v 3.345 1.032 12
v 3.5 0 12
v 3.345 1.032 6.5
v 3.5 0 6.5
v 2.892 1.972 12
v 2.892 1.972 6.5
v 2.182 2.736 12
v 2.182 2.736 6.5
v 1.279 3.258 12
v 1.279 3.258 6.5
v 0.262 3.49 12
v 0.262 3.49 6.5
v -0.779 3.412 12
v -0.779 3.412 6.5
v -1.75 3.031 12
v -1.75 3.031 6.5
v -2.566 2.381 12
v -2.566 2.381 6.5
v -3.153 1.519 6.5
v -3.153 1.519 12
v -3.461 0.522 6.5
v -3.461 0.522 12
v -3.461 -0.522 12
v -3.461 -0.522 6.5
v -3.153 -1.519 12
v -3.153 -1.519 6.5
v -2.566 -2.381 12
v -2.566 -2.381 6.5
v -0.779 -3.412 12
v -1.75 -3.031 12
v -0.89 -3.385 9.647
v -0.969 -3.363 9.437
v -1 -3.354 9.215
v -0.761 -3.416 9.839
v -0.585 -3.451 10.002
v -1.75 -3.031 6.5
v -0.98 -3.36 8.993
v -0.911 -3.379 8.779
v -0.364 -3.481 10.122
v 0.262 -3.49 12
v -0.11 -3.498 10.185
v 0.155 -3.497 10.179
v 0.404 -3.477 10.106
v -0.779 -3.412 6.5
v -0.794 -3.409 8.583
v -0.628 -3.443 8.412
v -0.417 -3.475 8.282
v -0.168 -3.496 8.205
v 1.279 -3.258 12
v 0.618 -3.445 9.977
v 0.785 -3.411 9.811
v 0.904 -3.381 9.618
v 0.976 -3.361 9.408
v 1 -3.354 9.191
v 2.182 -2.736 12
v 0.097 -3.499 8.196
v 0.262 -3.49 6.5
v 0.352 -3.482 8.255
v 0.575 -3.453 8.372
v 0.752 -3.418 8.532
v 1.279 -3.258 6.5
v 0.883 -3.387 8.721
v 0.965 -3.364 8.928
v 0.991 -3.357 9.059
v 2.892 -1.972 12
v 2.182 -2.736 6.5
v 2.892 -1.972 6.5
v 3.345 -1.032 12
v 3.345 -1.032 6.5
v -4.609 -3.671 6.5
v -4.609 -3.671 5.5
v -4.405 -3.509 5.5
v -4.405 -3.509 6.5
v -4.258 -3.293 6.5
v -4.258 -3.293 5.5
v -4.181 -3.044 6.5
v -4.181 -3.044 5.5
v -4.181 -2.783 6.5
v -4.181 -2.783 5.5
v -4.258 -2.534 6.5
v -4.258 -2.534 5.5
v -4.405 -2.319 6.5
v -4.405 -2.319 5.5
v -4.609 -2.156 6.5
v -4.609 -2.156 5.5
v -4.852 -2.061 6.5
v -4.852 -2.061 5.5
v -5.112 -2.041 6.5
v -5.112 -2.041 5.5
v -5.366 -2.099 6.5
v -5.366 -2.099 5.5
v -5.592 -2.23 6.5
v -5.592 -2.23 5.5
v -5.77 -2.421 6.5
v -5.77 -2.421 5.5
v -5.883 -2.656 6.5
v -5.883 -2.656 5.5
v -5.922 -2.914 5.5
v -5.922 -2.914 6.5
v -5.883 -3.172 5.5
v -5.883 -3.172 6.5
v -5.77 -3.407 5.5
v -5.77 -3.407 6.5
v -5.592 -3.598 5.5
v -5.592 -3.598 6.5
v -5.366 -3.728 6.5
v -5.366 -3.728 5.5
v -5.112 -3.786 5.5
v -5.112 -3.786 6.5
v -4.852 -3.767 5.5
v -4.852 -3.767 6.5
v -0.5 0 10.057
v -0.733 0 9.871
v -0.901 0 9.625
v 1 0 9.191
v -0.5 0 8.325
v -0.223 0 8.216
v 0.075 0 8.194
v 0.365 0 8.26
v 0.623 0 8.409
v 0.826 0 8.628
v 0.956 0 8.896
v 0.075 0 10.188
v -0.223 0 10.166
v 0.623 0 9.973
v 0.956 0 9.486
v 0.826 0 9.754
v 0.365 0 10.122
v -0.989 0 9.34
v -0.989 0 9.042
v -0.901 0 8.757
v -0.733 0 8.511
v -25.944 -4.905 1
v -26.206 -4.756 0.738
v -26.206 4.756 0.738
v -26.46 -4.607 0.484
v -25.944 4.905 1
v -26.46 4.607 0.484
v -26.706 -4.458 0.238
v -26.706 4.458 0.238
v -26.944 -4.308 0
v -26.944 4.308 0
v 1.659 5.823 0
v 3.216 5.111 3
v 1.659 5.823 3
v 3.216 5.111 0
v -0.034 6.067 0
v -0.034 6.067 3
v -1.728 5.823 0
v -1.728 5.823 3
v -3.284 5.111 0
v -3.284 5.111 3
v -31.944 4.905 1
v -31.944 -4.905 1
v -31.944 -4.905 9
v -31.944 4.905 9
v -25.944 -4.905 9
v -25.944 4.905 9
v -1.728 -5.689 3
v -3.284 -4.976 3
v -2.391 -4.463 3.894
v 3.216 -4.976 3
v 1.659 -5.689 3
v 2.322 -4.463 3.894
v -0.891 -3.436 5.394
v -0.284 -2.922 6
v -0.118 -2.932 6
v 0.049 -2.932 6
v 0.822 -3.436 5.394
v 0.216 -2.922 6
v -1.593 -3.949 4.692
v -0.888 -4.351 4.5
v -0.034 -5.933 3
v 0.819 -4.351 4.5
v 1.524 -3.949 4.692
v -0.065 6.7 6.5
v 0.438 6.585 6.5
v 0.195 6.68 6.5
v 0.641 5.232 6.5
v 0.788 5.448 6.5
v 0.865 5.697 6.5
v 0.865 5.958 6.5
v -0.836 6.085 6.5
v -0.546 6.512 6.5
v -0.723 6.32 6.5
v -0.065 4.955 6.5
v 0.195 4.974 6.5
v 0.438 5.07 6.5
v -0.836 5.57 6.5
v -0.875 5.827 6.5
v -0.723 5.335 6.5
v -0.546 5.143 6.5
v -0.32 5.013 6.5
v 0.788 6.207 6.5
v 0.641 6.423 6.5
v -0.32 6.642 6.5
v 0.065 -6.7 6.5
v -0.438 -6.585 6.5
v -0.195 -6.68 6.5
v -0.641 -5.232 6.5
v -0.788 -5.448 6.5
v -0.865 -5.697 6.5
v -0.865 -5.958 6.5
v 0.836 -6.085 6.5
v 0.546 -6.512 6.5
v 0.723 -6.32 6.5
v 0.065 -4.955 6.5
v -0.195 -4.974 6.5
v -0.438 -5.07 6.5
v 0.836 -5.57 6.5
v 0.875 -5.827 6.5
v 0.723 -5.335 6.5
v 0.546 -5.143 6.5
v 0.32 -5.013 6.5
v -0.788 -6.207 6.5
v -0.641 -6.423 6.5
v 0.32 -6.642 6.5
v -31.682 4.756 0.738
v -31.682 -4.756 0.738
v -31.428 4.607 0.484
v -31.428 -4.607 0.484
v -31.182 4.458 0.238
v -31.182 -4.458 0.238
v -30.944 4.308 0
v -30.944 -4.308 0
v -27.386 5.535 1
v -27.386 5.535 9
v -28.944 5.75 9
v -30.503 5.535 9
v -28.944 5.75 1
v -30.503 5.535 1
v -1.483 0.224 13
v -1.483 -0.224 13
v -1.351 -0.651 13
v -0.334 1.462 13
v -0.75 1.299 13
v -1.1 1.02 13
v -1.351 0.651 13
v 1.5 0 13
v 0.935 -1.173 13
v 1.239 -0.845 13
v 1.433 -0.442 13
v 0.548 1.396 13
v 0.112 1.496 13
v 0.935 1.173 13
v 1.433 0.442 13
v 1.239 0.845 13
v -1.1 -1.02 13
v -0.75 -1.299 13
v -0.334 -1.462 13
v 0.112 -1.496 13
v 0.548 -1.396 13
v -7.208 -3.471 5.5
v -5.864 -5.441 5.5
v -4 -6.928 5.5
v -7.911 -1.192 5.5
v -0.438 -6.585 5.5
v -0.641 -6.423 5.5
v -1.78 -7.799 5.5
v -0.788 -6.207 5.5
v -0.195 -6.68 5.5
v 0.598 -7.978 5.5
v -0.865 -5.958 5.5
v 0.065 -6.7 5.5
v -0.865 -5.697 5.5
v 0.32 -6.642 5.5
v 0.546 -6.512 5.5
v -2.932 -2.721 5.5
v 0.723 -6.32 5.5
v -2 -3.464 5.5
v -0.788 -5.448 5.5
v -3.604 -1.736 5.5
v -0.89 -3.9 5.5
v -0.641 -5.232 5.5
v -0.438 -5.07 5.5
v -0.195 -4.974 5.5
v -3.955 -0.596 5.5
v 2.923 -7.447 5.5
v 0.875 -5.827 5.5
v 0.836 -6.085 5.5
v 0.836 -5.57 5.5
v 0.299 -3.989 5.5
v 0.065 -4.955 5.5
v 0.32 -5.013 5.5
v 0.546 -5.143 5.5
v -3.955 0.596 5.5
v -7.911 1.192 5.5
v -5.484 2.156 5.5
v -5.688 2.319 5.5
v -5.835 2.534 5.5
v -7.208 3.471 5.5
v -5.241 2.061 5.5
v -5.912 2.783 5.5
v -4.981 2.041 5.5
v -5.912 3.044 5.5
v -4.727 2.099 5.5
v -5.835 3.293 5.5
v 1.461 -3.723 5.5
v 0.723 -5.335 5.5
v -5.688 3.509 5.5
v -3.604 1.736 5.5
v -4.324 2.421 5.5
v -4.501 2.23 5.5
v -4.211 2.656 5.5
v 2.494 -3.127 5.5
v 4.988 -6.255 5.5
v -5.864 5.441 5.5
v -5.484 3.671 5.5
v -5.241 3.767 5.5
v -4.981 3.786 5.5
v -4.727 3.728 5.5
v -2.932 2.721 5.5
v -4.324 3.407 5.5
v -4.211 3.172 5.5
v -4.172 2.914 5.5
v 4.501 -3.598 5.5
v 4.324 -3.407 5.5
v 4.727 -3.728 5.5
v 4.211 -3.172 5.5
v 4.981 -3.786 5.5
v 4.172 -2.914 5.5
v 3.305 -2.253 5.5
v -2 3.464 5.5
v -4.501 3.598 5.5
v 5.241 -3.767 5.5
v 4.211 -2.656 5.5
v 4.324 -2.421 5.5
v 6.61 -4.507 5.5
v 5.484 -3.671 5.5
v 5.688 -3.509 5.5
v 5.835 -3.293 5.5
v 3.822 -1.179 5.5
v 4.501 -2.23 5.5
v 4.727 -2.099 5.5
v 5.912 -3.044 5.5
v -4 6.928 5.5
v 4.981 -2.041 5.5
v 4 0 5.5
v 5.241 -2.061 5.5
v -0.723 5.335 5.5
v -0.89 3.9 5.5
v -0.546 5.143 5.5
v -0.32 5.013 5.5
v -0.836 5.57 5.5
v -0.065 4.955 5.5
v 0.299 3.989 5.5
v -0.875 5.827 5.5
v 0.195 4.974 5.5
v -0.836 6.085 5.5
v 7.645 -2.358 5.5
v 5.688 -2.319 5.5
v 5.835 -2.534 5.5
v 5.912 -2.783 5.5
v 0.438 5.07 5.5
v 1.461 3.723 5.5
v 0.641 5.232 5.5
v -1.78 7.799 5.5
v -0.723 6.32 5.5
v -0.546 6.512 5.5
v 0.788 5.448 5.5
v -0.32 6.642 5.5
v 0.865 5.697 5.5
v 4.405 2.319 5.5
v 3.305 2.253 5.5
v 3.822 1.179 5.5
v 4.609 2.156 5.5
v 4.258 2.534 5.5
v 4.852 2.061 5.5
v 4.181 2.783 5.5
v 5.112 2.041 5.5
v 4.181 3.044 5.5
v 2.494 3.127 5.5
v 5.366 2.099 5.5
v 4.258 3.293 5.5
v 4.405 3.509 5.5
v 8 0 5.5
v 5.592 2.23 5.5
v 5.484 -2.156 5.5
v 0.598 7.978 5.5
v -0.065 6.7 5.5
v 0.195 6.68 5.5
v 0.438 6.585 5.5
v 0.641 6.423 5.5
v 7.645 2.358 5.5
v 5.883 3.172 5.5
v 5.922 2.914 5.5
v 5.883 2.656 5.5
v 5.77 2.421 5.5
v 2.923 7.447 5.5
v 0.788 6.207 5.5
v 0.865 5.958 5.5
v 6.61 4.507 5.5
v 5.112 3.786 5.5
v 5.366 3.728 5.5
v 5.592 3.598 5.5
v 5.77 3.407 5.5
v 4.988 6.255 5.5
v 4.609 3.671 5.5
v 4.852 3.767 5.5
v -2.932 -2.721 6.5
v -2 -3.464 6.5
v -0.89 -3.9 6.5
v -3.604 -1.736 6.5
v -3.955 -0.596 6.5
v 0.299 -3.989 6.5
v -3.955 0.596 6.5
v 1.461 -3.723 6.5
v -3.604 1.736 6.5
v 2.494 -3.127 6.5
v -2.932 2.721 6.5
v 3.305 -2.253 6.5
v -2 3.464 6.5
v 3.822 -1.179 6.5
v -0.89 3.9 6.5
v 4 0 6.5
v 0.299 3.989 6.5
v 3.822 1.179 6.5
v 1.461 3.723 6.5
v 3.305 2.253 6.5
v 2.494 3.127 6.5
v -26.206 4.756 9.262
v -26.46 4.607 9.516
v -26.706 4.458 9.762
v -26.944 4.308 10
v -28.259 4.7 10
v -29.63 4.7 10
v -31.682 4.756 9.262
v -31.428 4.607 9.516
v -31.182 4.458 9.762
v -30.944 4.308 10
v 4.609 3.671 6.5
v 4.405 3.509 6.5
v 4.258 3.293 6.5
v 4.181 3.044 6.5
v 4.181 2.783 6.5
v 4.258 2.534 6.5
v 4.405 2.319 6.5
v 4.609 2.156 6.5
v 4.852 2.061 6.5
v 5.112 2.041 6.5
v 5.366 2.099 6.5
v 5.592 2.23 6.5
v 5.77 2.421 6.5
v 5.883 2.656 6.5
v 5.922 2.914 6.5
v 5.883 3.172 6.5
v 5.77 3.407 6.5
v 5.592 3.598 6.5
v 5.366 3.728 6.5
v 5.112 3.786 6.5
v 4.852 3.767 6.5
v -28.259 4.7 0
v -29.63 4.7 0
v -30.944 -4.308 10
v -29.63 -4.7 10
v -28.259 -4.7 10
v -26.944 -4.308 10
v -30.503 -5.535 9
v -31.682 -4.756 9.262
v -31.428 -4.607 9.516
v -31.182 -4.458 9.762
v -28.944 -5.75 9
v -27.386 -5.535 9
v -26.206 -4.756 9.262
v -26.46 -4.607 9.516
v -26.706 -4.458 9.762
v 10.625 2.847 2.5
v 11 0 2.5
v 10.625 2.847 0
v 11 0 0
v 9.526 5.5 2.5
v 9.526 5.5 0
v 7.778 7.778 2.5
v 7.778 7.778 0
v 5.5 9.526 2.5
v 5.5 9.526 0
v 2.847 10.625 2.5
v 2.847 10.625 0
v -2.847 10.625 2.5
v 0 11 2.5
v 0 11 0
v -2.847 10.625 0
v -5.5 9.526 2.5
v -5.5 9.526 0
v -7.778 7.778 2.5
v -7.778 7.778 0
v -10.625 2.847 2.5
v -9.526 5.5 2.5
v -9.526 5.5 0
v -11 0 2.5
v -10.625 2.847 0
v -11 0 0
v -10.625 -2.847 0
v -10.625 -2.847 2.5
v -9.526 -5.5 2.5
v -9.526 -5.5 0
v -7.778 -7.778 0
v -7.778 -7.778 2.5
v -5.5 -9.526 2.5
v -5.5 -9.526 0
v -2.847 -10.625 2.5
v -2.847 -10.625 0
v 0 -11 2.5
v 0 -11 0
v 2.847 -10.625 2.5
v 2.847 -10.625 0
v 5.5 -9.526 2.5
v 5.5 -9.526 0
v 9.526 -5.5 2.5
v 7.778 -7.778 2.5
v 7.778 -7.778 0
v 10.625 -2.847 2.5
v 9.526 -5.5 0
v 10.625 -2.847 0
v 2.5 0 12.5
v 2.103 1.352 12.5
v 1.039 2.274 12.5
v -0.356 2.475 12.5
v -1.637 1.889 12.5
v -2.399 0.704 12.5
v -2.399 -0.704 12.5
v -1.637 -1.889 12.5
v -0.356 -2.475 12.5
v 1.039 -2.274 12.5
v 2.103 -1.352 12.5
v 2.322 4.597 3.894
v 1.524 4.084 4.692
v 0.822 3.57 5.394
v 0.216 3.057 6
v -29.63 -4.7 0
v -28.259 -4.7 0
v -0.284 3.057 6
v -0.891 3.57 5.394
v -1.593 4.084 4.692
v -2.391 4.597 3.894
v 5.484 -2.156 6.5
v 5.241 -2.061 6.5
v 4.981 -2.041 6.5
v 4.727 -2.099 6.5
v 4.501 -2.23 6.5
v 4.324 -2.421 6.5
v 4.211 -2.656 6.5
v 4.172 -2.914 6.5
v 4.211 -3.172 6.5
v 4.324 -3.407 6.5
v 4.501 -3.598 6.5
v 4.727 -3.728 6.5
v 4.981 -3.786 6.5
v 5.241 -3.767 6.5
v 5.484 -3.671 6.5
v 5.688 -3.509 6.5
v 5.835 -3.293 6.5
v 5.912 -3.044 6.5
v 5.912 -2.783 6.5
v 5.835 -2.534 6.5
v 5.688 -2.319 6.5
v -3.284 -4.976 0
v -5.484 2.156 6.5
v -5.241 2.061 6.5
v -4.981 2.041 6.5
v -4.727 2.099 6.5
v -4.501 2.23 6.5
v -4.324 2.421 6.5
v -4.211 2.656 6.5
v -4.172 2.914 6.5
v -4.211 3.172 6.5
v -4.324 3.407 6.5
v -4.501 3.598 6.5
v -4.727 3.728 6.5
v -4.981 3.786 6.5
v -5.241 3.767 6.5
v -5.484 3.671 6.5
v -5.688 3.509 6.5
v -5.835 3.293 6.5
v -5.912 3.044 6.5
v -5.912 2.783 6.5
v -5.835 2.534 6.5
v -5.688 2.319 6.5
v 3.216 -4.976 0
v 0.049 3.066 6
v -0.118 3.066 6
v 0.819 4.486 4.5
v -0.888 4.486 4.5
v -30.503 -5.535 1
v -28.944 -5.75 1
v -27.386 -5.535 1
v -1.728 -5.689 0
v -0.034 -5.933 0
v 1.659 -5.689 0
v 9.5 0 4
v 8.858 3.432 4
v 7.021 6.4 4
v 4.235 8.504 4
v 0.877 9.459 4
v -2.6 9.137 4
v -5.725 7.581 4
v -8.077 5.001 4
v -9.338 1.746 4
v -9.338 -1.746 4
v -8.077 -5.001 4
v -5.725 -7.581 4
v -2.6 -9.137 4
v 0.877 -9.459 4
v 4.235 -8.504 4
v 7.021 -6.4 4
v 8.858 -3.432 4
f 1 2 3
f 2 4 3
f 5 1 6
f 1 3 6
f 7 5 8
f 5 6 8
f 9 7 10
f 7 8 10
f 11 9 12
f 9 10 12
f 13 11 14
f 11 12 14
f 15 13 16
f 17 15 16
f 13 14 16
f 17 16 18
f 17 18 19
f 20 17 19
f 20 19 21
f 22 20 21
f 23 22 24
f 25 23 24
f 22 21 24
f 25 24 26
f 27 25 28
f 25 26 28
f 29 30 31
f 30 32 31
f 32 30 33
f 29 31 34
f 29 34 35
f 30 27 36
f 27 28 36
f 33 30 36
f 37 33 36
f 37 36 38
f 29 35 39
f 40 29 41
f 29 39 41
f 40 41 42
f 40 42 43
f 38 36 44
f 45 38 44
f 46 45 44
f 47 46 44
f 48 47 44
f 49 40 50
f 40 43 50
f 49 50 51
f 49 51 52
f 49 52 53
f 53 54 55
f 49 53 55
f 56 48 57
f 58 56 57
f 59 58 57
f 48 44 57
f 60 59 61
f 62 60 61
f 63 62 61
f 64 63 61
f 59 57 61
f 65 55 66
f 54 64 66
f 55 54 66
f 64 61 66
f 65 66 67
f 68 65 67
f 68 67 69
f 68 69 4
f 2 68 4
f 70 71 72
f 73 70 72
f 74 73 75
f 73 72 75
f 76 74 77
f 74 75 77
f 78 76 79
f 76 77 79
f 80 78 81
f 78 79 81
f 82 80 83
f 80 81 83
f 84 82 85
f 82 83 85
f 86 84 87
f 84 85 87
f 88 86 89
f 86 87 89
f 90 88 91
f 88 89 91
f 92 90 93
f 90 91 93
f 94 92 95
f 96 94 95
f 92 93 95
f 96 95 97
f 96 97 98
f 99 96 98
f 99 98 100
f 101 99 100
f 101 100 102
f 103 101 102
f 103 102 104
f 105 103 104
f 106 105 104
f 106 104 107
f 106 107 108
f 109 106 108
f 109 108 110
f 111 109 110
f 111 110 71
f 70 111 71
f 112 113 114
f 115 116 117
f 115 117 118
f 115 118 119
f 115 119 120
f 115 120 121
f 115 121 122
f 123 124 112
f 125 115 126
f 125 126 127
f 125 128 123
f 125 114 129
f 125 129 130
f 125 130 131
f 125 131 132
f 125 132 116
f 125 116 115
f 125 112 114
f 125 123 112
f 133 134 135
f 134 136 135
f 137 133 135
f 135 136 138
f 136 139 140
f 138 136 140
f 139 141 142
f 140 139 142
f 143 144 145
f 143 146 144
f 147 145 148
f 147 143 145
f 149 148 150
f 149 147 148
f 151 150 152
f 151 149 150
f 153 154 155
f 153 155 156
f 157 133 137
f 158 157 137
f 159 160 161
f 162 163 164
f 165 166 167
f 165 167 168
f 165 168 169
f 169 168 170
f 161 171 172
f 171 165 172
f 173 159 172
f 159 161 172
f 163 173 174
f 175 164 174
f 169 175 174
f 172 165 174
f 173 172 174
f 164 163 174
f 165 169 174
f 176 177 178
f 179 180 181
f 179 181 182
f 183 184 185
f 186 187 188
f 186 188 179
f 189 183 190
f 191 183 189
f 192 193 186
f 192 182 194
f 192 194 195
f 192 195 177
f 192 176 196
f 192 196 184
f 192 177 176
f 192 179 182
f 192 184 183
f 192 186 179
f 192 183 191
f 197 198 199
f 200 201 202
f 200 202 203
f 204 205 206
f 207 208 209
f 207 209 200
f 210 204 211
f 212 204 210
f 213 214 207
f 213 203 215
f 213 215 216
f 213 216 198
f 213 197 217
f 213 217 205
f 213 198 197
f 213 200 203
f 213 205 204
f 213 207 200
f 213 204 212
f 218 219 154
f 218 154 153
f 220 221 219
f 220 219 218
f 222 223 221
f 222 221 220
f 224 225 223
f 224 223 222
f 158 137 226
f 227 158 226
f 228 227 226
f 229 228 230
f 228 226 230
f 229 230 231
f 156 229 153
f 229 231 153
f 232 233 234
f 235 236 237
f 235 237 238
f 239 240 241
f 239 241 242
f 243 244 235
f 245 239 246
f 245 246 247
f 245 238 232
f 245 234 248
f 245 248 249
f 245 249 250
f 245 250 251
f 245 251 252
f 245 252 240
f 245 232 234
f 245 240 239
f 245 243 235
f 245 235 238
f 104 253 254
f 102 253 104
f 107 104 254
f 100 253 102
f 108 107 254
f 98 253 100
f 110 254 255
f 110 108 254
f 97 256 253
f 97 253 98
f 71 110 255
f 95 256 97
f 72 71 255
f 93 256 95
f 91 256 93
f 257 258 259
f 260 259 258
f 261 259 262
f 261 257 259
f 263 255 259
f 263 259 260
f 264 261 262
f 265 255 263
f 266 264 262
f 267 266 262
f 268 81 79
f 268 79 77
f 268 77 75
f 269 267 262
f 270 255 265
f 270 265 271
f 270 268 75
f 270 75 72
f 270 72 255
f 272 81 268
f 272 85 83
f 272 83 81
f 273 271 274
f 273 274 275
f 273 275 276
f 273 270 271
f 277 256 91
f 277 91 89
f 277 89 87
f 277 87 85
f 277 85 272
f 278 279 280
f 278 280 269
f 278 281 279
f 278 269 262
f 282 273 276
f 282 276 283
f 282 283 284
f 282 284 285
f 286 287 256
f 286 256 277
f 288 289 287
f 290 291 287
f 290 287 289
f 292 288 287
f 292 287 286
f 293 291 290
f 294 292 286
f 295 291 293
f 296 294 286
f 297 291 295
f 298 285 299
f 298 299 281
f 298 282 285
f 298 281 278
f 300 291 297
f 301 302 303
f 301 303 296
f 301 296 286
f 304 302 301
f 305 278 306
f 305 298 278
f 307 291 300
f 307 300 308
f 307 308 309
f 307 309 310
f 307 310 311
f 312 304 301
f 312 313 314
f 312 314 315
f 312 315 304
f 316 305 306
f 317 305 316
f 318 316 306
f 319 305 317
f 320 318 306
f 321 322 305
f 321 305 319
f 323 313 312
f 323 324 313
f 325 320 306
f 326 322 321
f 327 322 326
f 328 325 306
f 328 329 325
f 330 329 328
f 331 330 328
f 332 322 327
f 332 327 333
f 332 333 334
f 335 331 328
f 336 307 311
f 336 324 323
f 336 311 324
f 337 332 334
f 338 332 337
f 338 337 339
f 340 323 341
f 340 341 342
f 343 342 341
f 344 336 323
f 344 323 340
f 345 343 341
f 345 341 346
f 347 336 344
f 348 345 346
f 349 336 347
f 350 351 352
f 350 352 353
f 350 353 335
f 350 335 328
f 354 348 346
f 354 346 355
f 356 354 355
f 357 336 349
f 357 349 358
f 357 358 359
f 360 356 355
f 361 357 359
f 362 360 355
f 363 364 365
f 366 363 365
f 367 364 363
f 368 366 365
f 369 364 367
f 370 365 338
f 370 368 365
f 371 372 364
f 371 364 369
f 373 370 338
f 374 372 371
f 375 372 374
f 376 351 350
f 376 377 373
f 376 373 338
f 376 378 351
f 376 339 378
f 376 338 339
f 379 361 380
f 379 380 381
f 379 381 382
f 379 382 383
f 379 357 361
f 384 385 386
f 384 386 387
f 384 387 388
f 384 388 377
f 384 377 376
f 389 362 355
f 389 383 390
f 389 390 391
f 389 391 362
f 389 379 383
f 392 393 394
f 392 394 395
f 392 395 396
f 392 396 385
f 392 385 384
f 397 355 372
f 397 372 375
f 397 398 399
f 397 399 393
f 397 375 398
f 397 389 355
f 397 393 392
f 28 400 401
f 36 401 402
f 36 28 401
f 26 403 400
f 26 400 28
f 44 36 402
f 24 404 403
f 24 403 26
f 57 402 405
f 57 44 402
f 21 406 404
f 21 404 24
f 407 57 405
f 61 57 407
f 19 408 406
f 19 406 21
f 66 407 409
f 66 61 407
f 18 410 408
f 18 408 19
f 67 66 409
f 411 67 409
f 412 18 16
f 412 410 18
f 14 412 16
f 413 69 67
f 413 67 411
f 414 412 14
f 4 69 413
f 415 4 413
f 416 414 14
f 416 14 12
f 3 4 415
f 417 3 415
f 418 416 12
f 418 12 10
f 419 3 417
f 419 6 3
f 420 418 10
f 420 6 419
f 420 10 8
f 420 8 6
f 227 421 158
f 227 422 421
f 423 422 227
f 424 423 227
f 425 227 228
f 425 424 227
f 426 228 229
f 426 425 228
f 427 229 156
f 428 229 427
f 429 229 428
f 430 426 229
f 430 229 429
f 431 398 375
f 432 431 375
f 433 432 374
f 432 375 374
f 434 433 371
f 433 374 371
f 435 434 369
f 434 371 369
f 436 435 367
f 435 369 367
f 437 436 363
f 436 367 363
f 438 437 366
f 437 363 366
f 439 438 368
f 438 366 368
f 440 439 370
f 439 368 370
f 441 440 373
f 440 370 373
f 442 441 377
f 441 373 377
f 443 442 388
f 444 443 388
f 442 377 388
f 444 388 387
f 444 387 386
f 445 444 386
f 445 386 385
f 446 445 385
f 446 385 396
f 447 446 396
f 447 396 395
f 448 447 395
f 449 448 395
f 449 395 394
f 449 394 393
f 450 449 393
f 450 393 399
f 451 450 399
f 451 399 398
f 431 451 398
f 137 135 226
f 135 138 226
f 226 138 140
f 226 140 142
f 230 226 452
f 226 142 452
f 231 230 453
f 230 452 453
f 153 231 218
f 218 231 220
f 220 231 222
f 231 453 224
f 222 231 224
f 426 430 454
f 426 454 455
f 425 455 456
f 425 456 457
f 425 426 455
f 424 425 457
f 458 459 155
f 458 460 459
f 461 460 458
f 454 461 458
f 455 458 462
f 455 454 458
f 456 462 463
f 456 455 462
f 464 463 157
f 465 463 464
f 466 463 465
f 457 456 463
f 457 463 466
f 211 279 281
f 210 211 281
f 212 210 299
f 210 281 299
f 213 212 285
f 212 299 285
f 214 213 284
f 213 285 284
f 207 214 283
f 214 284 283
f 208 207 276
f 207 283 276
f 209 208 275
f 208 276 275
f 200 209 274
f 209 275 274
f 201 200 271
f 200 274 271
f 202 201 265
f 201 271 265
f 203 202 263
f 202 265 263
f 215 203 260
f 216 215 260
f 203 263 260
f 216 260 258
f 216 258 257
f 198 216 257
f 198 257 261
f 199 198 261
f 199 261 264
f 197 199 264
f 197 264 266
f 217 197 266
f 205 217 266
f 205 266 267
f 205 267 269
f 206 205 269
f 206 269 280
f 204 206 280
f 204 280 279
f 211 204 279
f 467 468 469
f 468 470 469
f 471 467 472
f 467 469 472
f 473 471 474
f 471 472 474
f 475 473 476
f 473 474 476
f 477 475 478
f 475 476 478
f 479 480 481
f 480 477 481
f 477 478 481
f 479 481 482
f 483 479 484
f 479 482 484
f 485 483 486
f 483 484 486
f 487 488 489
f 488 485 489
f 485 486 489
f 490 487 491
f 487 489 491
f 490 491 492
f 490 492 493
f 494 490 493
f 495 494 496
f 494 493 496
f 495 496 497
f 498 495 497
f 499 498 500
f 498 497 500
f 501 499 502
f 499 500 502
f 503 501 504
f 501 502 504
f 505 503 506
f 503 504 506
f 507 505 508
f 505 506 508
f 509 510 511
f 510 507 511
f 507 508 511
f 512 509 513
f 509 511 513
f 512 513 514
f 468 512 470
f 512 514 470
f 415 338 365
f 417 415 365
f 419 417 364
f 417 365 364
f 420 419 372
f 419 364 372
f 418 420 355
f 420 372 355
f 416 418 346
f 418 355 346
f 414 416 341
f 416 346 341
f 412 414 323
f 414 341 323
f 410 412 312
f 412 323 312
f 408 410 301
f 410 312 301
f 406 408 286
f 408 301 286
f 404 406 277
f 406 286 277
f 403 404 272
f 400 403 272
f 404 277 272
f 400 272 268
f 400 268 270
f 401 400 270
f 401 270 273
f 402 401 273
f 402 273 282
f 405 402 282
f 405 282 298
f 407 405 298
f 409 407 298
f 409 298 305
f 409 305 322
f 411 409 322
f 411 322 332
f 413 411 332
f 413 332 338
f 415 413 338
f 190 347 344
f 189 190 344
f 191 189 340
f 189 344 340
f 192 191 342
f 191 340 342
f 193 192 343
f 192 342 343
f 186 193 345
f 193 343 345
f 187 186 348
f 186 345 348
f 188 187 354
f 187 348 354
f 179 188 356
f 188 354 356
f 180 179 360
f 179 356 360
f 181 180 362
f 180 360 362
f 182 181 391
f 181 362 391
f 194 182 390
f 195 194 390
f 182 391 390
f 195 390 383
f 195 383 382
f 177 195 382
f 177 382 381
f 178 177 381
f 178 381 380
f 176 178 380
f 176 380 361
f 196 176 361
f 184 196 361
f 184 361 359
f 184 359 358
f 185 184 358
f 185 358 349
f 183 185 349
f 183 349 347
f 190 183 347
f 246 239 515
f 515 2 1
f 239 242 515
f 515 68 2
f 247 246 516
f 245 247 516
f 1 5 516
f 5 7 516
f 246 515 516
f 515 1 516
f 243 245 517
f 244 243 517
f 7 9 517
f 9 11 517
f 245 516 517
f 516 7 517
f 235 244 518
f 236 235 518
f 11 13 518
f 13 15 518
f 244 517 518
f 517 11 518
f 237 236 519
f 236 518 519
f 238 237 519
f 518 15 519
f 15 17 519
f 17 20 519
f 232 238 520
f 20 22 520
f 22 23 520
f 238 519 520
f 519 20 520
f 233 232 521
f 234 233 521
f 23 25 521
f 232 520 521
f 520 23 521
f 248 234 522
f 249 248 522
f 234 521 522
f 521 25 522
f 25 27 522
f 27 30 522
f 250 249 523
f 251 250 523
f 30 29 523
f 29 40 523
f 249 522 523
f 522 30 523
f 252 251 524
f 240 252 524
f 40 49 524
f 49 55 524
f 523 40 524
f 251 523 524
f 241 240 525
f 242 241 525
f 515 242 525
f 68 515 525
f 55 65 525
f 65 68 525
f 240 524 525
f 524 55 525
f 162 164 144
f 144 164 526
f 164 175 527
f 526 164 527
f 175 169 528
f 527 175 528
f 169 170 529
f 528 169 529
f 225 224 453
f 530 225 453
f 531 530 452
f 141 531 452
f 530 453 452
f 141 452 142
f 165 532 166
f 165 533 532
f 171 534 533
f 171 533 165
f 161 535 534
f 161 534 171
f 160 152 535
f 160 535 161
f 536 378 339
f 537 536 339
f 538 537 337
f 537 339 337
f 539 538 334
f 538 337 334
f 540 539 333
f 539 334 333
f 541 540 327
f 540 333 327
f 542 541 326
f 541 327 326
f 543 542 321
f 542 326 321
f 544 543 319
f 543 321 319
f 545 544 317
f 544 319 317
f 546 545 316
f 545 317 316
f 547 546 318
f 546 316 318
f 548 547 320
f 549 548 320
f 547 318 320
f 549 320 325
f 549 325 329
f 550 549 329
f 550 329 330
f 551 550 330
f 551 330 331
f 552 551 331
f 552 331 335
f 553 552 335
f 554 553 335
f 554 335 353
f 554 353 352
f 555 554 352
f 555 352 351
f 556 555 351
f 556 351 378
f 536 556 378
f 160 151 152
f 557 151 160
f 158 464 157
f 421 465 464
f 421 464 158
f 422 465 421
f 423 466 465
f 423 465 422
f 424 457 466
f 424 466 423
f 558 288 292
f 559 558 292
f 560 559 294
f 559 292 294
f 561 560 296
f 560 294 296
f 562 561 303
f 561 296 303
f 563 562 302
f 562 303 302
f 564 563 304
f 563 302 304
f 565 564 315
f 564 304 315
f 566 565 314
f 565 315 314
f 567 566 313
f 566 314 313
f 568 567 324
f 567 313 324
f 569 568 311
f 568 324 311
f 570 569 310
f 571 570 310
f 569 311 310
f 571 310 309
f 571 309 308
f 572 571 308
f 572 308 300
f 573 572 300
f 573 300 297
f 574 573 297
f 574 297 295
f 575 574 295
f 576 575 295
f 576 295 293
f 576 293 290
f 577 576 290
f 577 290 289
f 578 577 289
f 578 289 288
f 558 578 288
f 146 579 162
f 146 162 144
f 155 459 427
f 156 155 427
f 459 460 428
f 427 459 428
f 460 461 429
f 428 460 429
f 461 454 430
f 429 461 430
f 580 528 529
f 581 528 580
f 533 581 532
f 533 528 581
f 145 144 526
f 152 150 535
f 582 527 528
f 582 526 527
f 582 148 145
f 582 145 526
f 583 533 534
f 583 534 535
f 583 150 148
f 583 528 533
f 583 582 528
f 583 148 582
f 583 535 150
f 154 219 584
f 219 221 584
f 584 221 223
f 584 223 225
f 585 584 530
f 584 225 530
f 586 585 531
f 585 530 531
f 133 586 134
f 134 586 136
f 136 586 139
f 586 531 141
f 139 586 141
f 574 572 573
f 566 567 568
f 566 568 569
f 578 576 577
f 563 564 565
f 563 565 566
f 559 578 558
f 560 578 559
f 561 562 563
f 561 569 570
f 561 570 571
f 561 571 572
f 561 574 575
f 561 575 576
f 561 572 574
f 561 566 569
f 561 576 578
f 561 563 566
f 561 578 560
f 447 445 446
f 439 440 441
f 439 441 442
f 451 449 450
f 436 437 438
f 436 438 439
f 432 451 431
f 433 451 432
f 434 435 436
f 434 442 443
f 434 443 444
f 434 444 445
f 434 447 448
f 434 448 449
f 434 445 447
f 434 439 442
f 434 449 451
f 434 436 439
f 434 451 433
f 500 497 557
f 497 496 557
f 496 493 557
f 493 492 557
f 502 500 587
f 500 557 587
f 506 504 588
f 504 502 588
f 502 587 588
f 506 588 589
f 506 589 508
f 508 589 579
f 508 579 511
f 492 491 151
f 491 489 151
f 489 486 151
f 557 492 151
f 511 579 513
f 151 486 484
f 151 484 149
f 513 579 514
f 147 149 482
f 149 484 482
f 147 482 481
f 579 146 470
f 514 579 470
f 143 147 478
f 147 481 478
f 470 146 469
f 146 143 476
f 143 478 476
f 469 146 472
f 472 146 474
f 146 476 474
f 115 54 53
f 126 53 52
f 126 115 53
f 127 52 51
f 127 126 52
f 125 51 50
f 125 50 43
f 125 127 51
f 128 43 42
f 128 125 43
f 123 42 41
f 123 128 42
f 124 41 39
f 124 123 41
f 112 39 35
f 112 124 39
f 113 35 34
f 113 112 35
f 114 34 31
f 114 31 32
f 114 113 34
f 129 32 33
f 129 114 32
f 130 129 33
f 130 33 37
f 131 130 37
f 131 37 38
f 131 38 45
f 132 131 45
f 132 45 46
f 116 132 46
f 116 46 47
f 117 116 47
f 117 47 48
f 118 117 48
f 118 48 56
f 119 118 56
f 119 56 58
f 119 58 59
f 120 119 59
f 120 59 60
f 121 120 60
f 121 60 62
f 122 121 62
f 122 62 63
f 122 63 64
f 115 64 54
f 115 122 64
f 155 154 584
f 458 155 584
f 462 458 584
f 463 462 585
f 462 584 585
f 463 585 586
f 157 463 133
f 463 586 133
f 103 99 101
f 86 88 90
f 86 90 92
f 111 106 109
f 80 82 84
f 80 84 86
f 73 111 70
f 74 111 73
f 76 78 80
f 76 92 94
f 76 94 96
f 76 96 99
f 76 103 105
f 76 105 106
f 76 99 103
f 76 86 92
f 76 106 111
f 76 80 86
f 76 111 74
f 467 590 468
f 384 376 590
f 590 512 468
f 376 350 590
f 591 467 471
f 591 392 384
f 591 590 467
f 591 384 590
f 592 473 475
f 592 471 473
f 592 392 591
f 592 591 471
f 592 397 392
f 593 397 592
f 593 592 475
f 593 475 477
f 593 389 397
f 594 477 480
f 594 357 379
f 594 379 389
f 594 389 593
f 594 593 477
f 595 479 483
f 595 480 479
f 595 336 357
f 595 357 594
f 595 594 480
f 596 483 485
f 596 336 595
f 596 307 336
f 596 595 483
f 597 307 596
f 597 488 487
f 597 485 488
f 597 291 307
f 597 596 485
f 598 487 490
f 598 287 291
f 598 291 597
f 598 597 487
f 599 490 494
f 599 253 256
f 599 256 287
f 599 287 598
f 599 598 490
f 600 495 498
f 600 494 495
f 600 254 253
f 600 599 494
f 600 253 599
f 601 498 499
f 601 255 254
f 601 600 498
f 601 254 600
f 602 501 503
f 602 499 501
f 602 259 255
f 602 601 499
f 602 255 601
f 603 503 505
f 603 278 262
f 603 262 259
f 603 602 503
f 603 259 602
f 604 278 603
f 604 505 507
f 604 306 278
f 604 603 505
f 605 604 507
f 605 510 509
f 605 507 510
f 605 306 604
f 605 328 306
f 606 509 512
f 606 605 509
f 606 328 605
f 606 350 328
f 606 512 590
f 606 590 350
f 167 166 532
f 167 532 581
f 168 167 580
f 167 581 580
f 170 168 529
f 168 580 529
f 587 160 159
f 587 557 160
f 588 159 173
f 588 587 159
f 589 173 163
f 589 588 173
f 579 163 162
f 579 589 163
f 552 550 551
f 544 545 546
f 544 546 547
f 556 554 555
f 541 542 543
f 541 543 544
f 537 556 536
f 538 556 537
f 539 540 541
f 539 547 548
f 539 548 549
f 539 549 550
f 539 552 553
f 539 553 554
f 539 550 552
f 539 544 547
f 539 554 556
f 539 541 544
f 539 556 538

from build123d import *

# Parameters (mm, degrees)
F0_W        = 6
F0_H        = 9.8107084352
F1_DEPTH    = 10
F2_SIZE     = 1
F3_R        = 11
F4_DEPTH    = 5.5
F5_SIZE     = 3
F6_R        = 0.875
F7_DEPTH    = 6.5
F8_COUNT    = 6
F9_R        = 4
F10_DEPTH   = 6.5
F11_R       = 3.5
F12_DEPTH   = 13
F13_SIZE2   = 1
F13_SIZE    = 2
F15_DEPTH   = 6
F16_C1_SIZE = 3
F16_C2_SIZE = 3
F16_C3_SIZE = 3
F16_C4_SIZE = 3
F18_R       = 1
F19_DEPTH   = 4


with BuildPart() as f1:
    # F0 (on Top) → F1 (new body)
    with BuildSketch(Plane.XY):
        with BuildLine():
            Line((-31.9442992674, 4.9053542176), (-25.9442992674, 4.9053542176))
            ThreePointArc((-25.9442992674, 4.9053542176), (-28.9442992674, 5.75), (-31.9442992674, 4.9053542176))
        make_face()
        with Locations((-28.9442992674, 0)):
            Rectangle(F0_W, F0_H)
        with BuildLine():
            ThreePointArc((-31.9442992674, -4.9053542176), (-28.9442992674, -5.75), (-25.9442992674, -4.9053542176))
            Line((-25.9442992674, -4.9053542176), (-31.9442992674, -4.9053542176))
        make_face()
    extrude(amount=F1_DEPTH)

    # F2
    f2_edges = [f1.edges().sort_by_distance(p)[0] for p in [
        (-28.944299, 5.75, 10),
        (-31.944299, 0, 10),
        (-28.944299, -5.75, 10),
        (-25.944299, 0, 10),
        (-28.944299, 5.75, 0),
        (-31.944299, 0, 0),
        (-28.944299, -5.75, 0),
        (-25.944299, 0, 0),
    ]]
    chamfer(f2_edges, length=F2_SIZE)


with BuildPart() as f4:
    # F3 (on Top) → F4 (new body)
    with BuildSketch(Plane.XY):
        Circle(F3_R)
    extrude(amount=F4_DEPTH)

    # F5
    f5_edges = [f4.edges().sort_by_distance(p)[0] for p in [
        (-11, 0, 5.5),
    ]]
    chamfer(f5_edges, length=F5_SIZE)

    # F6 (on Top) → F7 (join)
    with BuildSketch(Plane.XY):
        with Locations((0, -5.8274352923)):
            Circle(F6_R)
    extrude(amount=F7_DEPTH)

    # F8: F4 ×6 about axis
    f8_axis = Axis((0, 0, 5.5), (0, 0, 1))


with BuildPart() as f4_1:
    add(f4.part)
    for i in range(1, F8_COUNT):
        add(f4.part.rotate(f8_axis, i * 360 / F8_COUNT))

    # F9 (on Top) → F10 (join)
    with BuildSketch(Plane.XY):
        Circle(F9_R)
    extrude(amount=F10_DEPTH)

    # F11 (on Top) → F12 (join)
    with BuildSketch(Plane.XY):
        Circle(F11_R)
    extrude(amount=F12_DEPTH)

    # F13
    f13_edges = [f4_1.edges().sort_by_distance(p)[0] for p in [
        (-3.5, 0, 13),
    ]]
    f13_side = f4_1.faces().sort_by_distance((0, 0, 13))[0]
    chamfer(f13_edges, length=F13_SIZE, length2=F13_SIZE2, reference=f13_side)


with BuildPart() as f15:
    # F14 (on Top) → F15 (new body)
    with BuildSketch(Plane.XY):
        with BuildLine():
            Line((-3.2844228611, 5.110756855), (-3.2844228611, -4.976363646))
            ThreePointArc((-3.2844228611, -4.976363646), (-0.0344228611, -5.9328033955), (3.2155771389, -4.976363646))
            Line((3.2155771389, -4.976363646), (3.2155771389, 5.110756855))
            ThreePointArc((3.2155771389, 5.110756855), (-0.0344228611, 6.0671966045), (-3.2844228611, 5.110756855))
        make_face()
    extrude(amount=F15_DEPTH)

    # F16: chamfer of 3 on 4 edges, made by hand

    # F16_c1
    f16_c1_edges = [f15.edges().sort_by_distance(p)[0] for p in [
        (3.2155771389, 0.0671966045, 6),
    ]]
    chamfer(f16_c1_edges, length=F16_C1_SIZE)

    # F16_c2
    f16_c2_edges = [f15.edges().sort_by_distance(p)[0] for p in [
        (-3.2844228611, 0.0671966045, 6),
    ]]
    chamfer(f16_c2_edges, length=F16_C2_SIZE)

    # F16_c3
    f16_c3_edges = [f15.edges().sort_by_distance(p)[0] for p in [
        (-0.0344228611, -5.9328033955, 6),
    ]]
    chamfer(f16_c3_edges, length=F16_C3_SIZE)

    # F16_c4
    f16_c4_edges = [f15.edges().sort_by_distance(p)[0] for p in [
        (-0.0344228611, 6.0671966045, 6),
    ]]
    chamfer(f16_c4_edges, length=F16_C4_SIZE)


with BuildPart() as f4_2:
    add(f4_1.part)

    # F17: cut F15
    add(f15.part, mode=Mode.SUBTRACT)

    # F18 (on Front) → F19 (cut)
    with BuildSketch(Plane.XZ):
        with Locations((0, 9.1908816248)):
            Circle(F18_R)
    extrude(amount=F19_DEPTH, mode=Mode.SUBTRACT)


solid = Compound([f1.part, f4_2.part])
